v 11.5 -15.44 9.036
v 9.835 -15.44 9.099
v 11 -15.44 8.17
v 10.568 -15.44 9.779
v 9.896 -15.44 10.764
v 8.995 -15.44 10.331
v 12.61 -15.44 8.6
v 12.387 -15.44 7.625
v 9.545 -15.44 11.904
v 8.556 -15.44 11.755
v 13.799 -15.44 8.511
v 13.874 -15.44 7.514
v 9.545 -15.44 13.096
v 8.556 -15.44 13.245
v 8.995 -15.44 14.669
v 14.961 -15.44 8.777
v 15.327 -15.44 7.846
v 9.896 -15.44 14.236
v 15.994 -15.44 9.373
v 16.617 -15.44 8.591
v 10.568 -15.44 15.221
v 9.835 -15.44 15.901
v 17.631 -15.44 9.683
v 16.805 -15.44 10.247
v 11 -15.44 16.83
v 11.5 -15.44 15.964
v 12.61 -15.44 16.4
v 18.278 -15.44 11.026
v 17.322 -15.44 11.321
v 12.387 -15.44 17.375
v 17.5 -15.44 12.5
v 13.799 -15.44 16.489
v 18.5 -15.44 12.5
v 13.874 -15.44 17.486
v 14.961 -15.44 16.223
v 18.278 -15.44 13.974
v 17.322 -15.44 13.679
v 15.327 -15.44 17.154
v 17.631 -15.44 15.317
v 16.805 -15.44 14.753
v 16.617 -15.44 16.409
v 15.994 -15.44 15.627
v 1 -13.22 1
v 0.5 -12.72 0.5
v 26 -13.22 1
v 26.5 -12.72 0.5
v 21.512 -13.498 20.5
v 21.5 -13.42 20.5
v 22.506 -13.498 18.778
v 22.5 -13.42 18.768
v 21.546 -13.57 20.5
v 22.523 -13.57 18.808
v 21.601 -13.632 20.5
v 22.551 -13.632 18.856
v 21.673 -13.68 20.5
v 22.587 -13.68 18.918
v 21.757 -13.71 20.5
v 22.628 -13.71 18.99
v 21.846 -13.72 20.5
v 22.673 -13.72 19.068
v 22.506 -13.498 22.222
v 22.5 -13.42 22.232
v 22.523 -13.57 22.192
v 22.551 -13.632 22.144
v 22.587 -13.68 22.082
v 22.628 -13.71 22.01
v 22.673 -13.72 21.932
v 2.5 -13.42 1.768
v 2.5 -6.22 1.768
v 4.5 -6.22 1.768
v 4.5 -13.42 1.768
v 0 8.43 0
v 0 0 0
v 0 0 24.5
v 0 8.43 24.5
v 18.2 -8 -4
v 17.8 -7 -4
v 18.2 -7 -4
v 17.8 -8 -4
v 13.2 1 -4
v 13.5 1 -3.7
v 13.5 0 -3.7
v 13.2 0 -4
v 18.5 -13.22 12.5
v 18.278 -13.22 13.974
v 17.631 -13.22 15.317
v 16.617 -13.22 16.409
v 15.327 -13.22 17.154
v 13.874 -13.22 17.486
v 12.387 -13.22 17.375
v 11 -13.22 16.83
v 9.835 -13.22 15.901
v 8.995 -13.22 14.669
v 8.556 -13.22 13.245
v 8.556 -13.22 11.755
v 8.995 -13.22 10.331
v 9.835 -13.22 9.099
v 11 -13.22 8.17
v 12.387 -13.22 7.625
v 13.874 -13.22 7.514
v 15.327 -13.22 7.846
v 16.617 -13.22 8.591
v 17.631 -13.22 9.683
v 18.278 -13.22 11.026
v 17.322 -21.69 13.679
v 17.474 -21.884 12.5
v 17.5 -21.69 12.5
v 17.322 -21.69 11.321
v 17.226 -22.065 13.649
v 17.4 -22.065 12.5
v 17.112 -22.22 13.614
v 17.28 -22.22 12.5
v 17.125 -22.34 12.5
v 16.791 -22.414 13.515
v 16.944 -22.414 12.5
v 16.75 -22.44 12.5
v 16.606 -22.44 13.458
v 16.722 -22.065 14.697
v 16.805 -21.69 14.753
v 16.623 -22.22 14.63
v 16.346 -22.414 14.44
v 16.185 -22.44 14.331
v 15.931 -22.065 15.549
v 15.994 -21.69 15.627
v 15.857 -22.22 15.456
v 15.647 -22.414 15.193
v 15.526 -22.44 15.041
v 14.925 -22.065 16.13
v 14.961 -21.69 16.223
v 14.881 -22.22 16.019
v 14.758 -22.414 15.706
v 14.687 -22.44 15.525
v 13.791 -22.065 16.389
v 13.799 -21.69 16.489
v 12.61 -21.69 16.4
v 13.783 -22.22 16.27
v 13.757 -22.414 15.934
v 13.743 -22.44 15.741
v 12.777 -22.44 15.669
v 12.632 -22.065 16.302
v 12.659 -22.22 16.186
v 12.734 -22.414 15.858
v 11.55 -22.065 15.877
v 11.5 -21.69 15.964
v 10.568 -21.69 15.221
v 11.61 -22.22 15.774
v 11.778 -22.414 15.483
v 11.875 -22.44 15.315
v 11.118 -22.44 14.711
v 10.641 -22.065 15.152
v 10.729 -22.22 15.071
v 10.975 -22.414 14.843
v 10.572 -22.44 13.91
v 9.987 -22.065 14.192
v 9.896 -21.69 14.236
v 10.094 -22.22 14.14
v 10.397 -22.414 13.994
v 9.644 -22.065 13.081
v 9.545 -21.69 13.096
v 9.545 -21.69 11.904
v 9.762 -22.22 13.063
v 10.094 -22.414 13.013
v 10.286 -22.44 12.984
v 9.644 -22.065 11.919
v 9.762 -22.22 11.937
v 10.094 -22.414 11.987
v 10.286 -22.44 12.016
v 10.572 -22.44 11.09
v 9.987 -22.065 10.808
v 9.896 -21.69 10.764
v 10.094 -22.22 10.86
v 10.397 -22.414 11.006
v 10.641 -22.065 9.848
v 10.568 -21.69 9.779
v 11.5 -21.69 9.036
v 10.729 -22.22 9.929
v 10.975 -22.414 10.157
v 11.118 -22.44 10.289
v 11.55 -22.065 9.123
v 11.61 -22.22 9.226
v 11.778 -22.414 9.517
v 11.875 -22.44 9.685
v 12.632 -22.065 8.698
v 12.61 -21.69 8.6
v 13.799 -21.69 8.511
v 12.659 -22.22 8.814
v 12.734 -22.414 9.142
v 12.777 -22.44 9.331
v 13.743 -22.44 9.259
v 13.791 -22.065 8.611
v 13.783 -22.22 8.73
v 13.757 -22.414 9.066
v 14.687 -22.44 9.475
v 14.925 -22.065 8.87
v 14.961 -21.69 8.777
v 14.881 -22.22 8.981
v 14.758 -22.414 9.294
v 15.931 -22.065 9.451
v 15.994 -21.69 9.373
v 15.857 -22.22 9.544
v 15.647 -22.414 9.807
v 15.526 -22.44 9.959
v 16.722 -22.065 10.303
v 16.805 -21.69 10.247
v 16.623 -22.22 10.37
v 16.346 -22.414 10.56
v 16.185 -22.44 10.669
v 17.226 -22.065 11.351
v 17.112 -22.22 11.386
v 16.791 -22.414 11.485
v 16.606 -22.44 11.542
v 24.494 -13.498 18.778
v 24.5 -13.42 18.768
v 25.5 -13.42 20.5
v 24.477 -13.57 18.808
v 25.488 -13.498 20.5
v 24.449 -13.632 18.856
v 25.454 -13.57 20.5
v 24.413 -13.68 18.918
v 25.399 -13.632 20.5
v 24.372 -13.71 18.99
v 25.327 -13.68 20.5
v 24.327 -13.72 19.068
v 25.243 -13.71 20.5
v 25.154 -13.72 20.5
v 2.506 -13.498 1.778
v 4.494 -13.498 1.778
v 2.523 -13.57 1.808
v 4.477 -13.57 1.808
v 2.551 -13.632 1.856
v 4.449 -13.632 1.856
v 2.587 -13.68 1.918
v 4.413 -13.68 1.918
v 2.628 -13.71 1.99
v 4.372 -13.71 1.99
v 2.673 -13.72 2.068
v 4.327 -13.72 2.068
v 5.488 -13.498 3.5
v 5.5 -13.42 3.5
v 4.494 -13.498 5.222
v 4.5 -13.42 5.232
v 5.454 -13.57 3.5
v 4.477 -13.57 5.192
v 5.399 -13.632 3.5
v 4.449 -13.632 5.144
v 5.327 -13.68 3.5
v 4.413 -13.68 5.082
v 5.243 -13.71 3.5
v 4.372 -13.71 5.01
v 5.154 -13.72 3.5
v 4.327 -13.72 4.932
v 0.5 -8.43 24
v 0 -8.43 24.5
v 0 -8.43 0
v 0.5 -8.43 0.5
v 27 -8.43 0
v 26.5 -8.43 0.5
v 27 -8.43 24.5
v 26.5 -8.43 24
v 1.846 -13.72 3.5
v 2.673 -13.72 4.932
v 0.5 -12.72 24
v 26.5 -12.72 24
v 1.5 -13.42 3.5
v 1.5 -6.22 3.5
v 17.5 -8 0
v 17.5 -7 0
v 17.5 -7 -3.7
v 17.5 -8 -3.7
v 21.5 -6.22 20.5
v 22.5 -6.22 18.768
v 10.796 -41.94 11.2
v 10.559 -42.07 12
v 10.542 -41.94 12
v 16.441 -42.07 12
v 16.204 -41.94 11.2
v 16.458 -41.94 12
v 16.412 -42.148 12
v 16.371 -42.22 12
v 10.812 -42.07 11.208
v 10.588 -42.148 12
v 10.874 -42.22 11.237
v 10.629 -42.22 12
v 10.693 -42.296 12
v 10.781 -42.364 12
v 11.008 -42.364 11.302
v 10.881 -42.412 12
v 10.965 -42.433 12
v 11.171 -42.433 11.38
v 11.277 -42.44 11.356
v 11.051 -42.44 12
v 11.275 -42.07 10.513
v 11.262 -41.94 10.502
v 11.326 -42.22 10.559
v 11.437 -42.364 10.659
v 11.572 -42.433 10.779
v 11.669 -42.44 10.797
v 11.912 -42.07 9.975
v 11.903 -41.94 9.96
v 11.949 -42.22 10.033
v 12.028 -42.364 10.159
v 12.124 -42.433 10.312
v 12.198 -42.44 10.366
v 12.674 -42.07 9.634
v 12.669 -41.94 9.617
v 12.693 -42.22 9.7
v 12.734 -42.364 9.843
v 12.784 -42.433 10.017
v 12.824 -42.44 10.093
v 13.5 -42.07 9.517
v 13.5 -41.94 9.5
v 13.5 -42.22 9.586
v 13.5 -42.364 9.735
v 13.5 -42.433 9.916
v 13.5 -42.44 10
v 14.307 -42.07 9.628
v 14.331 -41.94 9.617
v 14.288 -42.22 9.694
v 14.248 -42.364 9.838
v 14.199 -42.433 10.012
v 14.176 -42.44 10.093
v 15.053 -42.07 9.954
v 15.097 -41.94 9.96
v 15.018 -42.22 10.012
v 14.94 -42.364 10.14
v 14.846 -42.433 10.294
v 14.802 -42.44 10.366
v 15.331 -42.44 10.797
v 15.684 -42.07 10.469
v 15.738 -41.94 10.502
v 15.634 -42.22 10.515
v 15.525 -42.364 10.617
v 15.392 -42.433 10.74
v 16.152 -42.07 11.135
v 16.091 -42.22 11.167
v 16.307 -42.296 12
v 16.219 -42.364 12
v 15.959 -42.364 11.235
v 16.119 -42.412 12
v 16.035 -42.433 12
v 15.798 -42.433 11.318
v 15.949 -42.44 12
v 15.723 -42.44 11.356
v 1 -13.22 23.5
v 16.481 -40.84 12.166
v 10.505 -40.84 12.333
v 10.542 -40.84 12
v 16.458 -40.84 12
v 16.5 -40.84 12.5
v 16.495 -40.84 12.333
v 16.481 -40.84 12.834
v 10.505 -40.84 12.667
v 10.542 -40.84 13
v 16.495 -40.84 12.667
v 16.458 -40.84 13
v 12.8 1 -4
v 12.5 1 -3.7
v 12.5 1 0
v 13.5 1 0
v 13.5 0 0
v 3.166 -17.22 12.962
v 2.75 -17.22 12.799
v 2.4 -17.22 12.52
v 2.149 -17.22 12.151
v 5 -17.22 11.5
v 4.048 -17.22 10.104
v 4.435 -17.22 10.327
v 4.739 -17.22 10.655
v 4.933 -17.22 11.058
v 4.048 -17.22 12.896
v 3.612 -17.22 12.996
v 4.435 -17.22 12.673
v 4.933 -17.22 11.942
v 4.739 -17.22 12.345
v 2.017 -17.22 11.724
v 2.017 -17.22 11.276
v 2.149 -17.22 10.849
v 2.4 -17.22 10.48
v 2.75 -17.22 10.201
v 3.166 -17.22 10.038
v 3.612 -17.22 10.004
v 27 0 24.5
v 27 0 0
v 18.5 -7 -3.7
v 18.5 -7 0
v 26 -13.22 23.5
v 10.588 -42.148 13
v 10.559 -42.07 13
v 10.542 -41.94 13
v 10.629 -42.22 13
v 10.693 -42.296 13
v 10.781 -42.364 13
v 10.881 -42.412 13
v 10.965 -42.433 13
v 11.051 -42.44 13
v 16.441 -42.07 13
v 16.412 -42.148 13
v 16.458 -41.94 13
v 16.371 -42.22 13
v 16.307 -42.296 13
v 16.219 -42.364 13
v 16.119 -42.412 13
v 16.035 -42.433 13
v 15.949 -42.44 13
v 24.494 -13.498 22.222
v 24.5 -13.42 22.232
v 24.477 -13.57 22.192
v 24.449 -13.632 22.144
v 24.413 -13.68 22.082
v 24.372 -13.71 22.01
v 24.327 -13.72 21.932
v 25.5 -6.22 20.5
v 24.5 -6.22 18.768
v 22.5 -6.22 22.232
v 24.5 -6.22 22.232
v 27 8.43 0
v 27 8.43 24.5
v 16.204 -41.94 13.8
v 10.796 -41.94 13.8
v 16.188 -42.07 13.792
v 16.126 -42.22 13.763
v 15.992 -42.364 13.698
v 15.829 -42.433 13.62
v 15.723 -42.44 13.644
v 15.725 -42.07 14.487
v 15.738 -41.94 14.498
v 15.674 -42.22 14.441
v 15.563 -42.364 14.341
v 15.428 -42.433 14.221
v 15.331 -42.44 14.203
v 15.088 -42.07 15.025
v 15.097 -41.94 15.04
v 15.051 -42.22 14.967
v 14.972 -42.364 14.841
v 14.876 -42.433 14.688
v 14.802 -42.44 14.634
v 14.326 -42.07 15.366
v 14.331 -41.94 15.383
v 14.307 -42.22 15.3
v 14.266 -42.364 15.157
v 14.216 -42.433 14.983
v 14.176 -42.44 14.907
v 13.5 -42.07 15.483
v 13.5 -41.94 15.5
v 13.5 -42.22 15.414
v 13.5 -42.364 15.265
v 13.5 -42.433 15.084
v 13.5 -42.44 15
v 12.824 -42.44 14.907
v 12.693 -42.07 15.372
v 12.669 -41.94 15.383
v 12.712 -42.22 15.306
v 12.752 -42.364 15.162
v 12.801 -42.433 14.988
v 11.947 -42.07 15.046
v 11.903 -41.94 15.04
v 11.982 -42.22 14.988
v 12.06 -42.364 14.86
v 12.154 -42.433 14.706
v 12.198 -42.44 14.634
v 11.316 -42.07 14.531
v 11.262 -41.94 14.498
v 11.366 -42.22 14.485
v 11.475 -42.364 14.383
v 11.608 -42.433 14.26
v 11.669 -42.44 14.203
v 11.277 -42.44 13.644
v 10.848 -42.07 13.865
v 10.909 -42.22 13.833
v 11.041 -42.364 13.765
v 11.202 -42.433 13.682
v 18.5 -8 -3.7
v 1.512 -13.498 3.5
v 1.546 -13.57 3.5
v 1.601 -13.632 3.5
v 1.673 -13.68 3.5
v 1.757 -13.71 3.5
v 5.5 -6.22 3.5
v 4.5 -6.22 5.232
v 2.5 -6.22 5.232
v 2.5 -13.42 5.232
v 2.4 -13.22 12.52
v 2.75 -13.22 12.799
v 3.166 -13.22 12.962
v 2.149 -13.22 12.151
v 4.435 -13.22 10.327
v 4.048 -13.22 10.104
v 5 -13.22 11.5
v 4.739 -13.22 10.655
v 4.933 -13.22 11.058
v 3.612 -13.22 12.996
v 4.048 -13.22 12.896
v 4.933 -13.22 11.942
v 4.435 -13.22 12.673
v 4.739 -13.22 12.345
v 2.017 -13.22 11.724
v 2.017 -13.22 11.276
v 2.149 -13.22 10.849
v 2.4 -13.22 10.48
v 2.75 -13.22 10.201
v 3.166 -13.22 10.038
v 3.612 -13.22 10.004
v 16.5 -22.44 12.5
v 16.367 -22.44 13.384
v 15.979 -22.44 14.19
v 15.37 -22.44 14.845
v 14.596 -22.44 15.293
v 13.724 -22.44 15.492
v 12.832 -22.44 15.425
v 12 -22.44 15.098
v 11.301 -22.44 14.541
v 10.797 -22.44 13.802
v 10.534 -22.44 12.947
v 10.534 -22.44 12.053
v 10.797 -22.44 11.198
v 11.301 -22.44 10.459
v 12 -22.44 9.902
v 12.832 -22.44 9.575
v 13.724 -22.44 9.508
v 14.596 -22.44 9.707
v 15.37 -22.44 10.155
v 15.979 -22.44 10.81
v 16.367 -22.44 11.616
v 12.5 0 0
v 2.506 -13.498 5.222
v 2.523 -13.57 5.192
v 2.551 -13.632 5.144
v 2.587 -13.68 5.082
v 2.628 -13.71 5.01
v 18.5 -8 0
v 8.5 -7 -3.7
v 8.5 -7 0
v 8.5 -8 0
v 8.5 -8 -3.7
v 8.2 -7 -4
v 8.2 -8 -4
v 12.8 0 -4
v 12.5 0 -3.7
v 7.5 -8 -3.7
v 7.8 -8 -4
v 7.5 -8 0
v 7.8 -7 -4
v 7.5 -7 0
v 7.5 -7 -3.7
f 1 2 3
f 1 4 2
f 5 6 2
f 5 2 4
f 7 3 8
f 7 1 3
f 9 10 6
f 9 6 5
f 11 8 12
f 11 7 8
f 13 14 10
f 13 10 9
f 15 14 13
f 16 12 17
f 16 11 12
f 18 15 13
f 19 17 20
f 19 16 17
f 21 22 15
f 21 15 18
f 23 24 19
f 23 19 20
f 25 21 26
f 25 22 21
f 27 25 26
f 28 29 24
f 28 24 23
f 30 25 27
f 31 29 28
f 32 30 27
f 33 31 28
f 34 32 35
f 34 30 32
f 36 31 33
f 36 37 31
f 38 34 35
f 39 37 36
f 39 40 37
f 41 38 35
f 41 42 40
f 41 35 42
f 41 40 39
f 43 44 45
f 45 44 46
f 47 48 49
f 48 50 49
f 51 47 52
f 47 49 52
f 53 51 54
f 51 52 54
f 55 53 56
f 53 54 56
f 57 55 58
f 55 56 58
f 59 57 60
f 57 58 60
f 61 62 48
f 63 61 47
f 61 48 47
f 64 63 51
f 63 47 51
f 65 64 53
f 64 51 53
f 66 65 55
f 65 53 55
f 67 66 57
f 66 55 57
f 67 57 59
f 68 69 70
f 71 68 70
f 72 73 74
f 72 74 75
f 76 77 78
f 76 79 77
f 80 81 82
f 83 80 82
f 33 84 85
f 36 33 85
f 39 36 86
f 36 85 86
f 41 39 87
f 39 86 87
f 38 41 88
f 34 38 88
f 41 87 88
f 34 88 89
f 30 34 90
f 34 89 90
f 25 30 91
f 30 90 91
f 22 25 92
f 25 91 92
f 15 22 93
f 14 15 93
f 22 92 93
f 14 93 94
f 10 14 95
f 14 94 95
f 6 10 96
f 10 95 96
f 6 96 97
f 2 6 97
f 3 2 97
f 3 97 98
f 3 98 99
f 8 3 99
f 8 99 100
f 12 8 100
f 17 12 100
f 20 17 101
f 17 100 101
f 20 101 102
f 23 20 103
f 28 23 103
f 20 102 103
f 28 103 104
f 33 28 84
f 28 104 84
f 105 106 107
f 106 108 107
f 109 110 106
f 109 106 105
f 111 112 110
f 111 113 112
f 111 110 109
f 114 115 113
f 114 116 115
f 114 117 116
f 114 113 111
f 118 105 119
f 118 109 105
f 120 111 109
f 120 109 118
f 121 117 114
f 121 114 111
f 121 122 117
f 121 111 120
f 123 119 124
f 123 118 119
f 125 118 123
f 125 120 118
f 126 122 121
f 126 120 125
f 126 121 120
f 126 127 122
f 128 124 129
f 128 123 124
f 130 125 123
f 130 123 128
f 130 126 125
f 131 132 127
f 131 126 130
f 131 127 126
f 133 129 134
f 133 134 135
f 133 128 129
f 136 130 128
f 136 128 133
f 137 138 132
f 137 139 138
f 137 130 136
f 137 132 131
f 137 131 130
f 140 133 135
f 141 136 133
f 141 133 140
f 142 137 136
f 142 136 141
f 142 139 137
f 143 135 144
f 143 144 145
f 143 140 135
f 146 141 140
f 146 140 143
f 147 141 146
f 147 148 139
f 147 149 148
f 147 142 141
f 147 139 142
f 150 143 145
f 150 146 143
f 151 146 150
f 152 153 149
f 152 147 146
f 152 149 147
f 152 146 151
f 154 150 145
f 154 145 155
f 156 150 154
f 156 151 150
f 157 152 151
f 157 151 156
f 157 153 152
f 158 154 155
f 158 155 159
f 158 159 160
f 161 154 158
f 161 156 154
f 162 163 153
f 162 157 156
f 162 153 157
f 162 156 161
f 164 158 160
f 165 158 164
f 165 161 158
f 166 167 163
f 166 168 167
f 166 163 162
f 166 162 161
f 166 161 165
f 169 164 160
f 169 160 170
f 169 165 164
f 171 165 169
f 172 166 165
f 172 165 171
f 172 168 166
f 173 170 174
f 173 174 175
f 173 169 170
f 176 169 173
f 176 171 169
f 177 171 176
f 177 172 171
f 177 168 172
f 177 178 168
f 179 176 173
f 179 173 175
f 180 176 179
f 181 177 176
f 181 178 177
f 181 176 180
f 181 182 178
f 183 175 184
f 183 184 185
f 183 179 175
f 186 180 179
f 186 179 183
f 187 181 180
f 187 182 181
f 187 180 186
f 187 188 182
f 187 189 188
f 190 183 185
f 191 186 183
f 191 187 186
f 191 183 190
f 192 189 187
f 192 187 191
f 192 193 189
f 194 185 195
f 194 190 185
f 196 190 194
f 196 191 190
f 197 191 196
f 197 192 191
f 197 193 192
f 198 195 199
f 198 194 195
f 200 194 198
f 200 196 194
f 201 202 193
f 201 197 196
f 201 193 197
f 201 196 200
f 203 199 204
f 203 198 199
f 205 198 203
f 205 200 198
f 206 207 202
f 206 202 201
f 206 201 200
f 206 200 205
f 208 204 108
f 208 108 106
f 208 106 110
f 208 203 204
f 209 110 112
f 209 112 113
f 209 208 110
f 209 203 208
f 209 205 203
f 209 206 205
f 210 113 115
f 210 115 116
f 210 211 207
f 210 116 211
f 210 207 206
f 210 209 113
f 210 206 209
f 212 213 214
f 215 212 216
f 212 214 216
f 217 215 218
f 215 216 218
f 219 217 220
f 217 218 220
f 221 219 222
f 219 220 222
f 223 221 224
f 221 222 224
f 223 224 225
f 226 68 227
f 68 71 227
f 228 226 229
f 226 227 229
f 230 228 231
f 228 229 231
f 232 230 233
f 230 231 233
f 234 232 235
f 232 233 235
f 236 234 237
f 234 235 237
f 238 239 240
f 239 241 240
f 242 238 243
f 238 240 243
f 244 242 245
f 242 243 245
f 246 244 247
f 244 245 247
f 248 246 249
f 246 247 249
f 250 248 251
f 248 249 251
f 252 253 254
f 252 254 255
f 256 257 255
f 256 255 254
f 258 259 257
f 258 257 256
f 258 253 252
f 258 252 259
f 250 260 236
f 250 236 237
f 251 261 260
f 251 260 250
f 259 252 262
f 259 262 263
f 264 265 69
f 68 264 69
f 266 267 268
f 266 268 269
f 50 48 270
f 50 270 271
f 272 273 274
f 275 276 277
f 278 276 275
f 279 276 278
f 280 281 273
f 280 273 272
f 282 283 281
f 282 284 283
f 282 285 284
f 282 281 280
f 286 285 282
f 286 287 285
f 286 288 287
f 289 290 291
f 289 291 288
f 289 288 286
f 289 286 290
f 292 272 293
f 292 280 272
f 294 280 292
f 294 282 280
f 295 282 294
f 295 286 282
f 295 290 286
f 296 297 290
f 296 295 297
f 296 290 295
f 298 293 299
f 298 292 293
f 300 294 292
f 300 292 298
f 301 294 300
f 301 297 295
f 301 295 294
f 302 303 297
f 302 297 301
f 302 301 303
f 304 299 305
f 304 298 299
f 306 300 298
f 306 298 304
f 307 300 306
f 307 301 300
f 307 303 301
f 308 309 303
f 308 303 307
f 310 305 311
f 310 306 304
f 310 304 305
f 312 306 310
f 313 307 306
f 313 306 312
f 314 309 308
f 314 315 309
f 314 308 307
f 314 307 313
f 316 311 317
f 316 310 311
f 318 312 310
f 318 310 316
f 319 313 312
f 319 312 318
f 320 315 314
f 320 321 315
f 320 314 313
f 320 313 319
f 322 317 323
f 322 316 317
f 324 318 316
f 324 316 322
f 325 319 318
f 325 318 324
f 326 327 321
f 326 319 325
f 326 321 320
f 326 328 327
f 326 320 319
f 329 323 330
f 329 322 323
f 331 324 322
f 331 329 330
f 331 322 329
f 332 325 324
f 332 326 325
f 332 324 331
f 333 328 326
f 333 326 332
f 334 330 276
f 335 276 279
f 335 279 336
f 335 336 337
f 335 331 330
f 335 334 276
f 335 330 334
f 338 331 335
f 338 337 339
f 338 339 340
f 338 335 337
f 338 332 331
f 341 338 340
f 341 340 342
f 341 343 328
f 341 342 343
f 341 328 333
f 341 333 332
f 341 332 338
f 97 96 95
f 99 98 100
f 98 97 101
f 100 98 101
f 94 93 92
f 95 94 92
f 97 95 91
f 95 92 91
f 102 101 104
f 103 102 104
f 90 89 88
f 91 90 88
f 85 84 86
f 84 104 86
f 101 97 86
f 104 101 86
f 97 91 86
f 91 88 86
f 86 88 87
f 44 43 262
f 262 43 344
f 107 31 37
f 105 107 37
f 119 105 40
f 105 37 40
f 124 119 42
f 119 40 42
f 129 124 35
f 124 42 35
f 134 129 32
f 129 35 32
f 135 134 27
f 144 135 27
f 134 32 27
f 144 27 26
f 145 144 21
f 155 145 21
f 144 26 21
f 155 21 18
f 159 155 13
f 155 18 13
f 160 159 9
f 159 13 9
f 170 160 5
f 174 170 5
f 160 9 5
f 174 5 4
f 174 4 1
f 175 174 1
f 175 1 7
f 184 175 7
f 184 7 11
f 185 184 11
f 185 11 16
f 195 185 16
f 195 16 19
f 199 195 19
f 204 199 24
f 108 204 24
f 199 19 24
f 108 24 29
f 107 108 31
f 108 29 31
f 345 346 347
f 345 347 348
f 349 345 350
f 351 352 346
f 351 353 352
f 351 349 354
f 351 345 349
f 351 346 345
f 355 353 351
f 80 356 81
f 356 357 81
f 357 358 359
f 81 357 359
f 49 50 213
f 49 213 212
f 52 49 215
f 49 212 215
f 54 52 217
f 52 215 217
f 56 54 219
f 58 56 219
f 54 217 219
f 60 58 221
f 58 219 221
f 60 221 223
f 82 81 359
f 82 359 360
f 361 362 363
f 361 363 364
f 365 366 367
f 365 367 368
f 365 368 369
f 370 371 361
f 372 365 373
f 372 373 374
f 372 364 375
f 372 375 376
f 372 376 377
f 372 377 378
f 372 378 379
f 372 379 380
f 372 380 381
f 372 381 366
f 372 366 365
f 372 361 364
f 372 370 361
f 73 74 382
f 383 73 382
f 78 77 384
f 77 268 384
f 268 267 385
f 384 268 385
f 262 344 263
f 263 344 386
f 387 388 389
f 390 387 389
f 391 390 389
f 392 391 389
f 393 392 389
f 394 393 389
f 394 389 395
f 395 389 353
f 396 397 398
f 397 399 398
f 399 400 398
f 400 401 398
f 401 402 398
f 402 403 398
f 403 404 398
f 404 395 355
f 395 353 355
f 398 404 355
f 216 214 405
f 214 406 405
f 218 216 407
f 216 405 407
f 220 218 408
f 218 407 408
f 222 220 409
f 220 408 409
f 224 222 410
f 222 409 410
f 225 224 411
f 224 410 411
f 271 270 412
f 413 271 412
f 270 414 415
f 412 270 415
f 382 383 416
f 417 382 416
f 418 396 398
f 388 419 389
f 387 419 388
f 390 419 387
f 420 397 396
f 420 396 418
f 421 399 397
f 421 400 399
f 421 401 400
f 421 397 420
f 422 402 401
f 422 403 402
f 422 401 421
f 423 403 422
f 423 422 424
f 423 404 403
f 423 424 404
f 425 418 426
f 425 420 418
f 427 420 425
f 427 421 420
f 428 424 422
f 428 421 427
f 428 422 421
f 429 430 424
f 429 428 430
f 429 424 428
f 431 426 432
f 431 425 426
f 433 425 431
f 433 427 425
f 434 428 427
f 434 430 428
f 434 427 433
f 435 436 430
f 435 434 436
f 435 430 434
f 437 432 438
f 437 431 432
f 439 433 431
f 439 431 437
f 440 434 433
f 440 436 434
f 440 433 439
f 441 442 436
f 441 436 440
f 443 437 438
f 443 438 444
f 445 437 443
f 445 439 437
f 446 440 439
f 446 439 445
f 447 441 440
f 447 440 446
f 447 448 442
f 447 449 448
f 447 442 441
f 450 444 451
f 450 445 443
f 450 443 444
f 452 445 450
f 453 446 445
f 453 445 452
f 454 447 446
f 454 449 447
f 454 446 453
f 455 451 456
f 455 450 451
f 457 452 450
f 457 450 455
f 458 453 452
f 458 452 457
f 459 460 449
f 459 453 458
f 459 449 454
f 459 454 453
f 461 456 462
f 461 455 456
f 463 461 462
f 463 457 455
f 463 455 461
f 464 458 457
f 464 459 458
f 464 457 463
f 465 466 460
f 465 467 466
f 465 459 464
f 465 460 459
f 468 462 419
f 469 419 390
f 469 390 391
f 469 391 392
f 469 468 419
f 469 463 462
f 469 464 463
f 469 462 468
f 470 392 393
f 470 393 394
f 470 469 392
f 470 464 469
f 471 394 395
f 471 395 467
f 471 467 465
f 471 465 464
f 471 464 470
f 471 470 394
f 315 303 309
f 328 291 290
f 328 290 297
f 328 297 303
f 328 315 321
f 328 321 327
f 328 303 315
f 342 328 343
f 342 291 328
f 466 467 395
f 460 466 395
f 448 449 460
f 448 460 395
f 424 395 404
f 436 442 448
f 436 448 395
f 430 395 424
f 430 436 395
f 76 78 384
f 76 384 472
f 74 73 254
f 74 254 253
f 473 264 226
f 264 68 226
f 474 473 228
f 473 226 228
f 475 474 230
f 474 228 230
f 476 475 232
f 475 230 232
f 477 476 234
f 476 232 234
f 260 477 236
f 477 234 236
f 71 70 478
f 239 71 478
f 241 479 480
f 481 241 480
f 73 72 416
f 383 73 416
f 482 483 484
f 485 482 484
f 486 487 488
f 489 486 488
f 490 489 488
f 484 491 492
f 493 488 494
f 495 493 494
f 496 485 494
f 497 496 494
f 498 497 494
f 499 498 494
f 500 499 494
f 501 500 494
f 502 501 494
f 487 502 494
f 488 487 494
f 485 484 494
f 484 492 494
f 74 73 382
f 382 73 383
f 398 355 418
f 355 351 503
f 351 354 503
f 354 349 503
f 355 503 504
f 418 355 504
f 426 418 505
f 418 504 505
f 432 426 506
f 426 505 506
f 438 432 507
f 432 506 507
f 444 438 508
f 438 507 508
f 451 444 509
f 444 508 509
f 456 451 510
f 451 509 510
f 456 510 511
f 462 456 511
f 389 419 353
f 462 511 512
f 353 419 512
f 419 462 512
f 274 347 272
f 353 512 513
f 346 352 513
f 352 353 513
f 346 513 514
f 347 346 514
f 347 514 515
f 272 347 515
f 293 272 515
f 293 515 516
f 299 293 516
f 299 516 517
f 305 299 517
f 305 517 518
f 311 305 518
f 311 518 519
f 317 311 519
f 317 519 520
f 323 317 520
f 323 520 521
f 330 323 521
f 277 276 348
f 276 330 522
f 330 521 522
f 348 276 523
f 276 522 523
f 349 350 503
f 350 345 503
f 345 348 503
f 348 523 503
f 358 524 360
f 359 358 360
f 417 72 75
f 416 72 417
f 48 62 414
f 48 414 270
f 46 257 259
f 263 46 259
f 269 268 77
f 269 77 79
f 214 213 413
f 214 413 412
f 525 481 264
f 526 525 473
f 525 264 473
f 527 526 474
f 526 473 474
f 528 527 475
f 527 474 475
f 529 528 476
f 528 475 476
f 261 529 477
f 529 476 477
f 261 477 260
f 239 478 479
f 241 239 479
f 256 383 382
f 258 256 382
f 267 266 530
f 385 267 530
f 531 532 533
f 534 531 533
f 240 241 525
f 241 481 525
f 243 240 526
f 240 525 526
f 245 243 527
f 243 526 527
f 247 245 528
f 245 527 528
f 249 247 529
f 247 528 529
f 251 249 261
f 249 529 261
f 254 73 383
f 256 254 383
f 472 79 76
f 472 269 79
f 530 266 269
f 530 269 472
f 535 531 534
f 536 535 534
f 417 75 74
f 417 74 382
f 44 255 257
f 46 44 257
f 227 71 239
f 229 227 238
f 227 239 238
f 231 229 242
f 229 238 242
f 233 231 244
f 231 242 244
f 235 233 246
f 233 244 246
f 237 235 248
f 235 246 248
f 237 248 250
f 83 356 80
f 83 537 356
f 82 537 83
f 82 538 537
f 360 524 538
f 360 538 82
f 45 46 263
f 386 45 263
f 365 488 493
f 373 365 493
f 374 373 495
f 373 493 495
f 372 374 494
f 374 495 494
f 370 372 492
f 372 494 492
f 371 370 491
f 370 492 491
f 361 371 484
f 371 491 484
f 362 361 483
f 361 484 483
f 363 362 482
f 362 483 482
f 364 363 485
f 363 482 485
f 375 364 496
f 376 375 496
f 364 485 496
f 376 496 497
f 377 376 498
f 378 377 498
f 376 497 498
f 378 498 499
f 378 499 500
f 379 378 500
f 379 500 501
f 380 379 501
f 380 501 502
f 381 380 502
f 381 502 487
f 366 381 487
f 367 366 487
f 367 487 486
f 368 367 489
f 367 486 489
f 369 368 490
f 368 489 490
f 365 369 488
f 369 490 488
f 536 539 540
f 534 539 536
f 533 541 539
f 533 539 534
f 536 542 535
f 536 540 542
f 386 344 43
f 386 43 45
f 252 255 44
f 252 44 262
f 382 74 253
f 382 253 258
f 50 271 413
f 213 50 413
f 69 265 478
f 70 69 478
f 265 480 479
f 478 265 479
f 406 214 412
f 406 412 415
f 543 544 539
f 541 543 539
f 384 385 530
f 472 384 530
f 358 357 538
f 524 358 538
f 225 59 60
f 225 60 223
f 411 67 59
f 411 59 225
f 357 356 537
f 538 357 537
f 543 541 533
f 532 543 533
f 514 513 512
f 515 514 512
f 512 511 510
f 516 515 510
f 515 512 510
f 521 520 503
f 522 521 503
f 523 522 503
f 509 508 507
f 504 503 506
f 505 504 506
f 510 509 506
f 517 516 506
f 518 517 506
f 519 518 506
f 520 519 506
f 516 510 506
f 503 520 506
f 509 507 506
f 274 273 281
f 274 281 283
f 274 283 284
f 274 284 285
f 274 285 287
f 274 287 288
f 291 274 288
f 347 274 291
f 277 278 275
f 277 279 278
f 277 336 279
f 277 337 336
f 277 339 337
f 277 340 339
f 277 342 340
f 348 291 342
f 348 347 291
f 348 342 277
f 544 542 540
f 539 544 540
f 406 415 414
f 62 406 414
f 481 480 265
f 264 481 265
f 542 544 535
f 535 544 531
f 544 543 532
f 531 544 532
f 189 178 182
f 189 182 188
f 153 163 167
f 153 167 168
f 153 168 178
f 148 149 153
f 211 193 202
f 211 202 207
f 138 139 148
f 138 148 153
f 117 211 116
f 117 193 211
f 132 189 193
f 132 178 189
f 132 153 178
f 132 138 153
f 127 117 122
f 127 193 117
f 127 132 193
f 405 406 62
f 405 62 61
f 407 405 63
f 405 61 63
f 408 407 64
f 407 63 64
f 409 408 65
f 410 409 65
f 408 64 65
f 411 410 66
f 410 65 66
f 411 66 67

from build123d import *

# Parameters (mm, degrees)
BOX_W             = 27
BOX_H             = 8.43
BOX_DEPTH         = 24.5
BOX001_W          = 27
BOX001_H          = 24.5
BOX001_DEPTH      = 8.43
BOX002_W          = 26
BOX002_H          = 23.5
BOX002_DEPTH      = 6.22
CHAMFER_SIZE      = 0.5
CYLINDER_R        = 5
CYLINDER_DEPTH    = 2.22
CYLINDER001_R     = 4
CYLINDER001_DEPTH = 7
FILLET_R          = 0.75
CYLINDER002_R     = 3
CYLINDER002_DEPTH = 20
FILLET001_R       = 0.5
BOX003_W          = 7
BOX003_H          = 1
BOX003_DEPTH      = 1.6
CYLINDER003_R     = 1.5
CYLINDER003_DEPTH = 4
BOX004_W          = 1
BOX004_H          = 1
BOX004_DEPTH      = 4
CHAMFER005_SIZE   = 0.3
CHAMFER006_SIZE   = 0.3
BOX005_W          = 1
BOX005_H          = 1
BOX005_DEPTH      = 4
CHAMFER003_SIZE   = 0.3
CHAMFER004_SIZE   = 0.3
BOX006_W          = 1
BOX006_H          = 1
BOX006_DEPTH      = 4
CHAMFER001_SIZE   = 0.3
CHAMFER002_SIZE   = 0.3
PRISM_DEPTH       = 7.5
FILLET002_R       = 0.3
PRISM001_DEPTH    = 7.5
FILLET003_R       = 0.3


with BuildPart() as body:
    # Box → Box (join)
    with BuildSketch(Plane.XY):
        with Locations((13.5, 4.215)):
            Rectangle(BOX_W, BOX_H)
    extrude(amount=BOX_DEPTH)


with BuildPart() as body001:
    # Box001 → Box001 (join)
    with BuildSketch(Plane.XZ):
        with Locations((13.5, 12.25)):
            Rectangle(BOX001_W, BOX001_H)
    extrude(amount=BOX001_DEPTH)

    # Box002 → Box002 (join)
    with BuildSketch(Plane(origin=(0.5, -7, 0.5), x_dir=(1, 0, 0), z_dir=(0, -1, 0))):
        with Locations((13, 11.75)):
            Rectangle(BOX002_W, BOX002_H)
    extrude(amount=BOX002_DEPTH)

    # Chamfer
    chamfer_edges = [body001.edges().sort_by_distance(p)[0] for p in [
        (13.5, -13.22, 24),
        (26.5, -13.22, 12.25),
        (13.5, -13.22, 0.5),
        (0.5, -13.22, 12.25),
    ]]
    chamfer(chamfer_edges, length=CHAMFER_SIZE)


with BuildPart() as body002:
    # Cylinder → Cylinder (join)
    with BuildSketch(Plane(origin=(13.5, -13.22, 12.5), x_dir=(1, 0, 0), z_dir=(0, -1, 0))):
        Circle(CYLINDER_R)
    extrude(amount=CYLINDER_DEPTH)

    # Cylinder001 → Cylinder001 (join)
    with BuildSketch(Plane(origin=(13.5, -15.44, 12.5), x_dir=(1, 0, 0), z_dir=(0, -1, 0))):
        Circle(CYLINDER001_R)
    extrude(amount=CYLINDER001_DEPTH)

    # Fillet
    fillet_edges = [body002.edges().sort_by_distance(p)[0] for p in [
        (9.5, -22.44, 12.5),
    ]]
    fillet(fillet_edges, radius=FILLET_R)


with BuildPart() as body003:
    # Cylinder002 → Cylinder002 (join)
    with BuildSketch(Plane(origin=(13.5, -22.44, 12.5), x_dir=(1, 0, 0), z_dir=(0, -1, 0))):
        Circle(CYLINDER002_R)
    extrude(amount=CYLINDER002_DEPTH)

    # Fillet001
    fillet001_edges = [body003.edges().sort_by_distance(p)[0] for p in [
        (10.5, -42.44, 12.5),
    ]]
    fillet(fillet001_edges, radius=FILLET001_R)

    # Box003 → Box003 (cut)
    with BuildSketch(Plane(origin=(9.9, -40.84, 12), x_dir=(1, 0, 0), z_dir=(0, -1, 0))):
        with Locations((3.5, 0.5)):
            Rectangle(BOX003_W, BOX003_H)
    extrude(amount=BOX003_DEPTH, mode=Mode.SUBTRACT)

    # Cylinder003 → Cylinder003 (join)
    with BuildSketch(Plane(origin=(3.5, -13.22, 11.5), x_dir=(1, 0, 0), z_dir=(0, -1, 0))):
        Circle(CYLINDER003_R)
    extrude(amount=CYLINDER003_DEPTH)


with BuildPart() as body004:
    # Box004 → Box004 (join)
    with BuildSketch(Plane(origin=(7.5, -7, 0), x_dir=(1, 0, 0), z_dir=(0, 0, -1))):
        with Locations((0.5, 0.5)):
            Rectangle(BOX004_W, BOX004_H)
    extrude(amount=BOX004_DEPTH)

    # Chamfer005
    chamfer005_edges = [body004.edges().sort_by_distance(p)[0] for p in [
        (7.5, -7.5, -4),
    ]]
    chamfer(chamfer005_edges, length=CHAMFER005_SIZE)

    # Chamfer006
    chamfer006_edges = [body004.edges().sort_by_distance(p)[0] for p in [
        (8.5, -7.5, -4),
    ]]
    chamfer(chamfer006_edges, length=CHAMFER006_SIZE)


with BuildPart() as body005:
    # Box005 → Box005 (join)
    with BuildSketch(Plane(origin=(12.5, 1, 0), x_dir=(1, 0, 0), z_dir=(0, 0, -1))):
        with Locations((0.5, 0.5)):
            Rectangle(BOX005_W, BOX005_H)
    extrude(amount=BOX005_DEPTH)

    # Chamfer003
    chamfer003_edges = [body005.edges().sort_by_distance(p)[0] for p in [
        (12.5, 0.5, -4),
    ]]
    chamfer(chamfer003_edges, length=CHAMFER003_SIZE)

    # Chamfer004
    chamfer004_edges = [body005.edges().sort_by_distance(p)[0] for p in [
        (13.5, 0.5, -4),
    ]]
    chamfer(chamfer004_edges, length=CHAMFER004_SIZE)


with BuildPart() as body006:
    # Box006 → Box006 (join)
    with BuildSketch(Plane(origin=(17.5, -7, 0), x_dir=(1, 0, 0), z_dir=(0, 0, -1))):
        with Locations((0.5, 0.5)):
            Rectangle(BOX006_W, BOX006_H)
    extrude(amount=BOX006_DEPTH)

    # Chamfer001
    chamfer001_edges = [body006.edges().sort_by_distance(p)[0] for p in [
        (18.5, -7.5, -4),
    ]]
    chamfer(chamfer001_edges, length=CHAMFER001_SIZE)

    # Chamfer002
    chamfer002_edges = [body006.edges().sort_by_distance(p)[0] for p in [
        (17.5, -7.5, -4),
    ]]
    chamfer(chamfer002_edges, length=CHAMFER002_SIZE)


with BuildPart() as body007:
    # Prism → Prism (join)
    with BuildSketch(Plane(origin=(23.5, -6.22, 20.5), x_dir=(1, 0, 0), z_dir=(0, -1, 0))):
        Polygon((2, 0), (1, 1.732051), (-1, 1.732051), (-2, 0), (-1, -1.732051), (1, -1.732051), align=None)
    extrude(amount=PRISM_DEPTH)

    # Fillet002
    fillet002_edges = [body007.edges().sort_by_distance(p)[0] for p in [
        (22, -13.72, 21.366025),
        (23.5, -13.72, 22.232051),
        (25, -13.72, 21.366025),
        (25, -13.72, 19.633975),
        (23.5, -13.72, 18.767949),
        (22, -13.72, 19.633975),
    ]]
    fillet(fillet002_edges, radius=FILLET002_R)


with BuildPart() as body008:
    # Prism001 → Prism001 (join)
    with BuildSketch(Plane(origin=(3.5, -6.22, 3.5), x_dir=(1, 0, 0), z_dir=(0, -1, 0))):
        Polygon((2, 0), (1, 1.732051), (-1, 1.732051), (-2, 0), (-1, -1.732051), (1, -1.732051), align=None)
    extrude(amount=PRISM001_DEPTH)

    # Fillet003
    fillet003_edges = [body008.edges().sort_by_distance(p)[0] for p in [
        (5, -13.72, 4.366025),
        (3.5, -13.72, 5.232051),
        (2, -13.72, 4.366025),
        (2, -13.72, 2.633975),
        (3.5, -13.72, 1.767949),
        (5, -13.72, 2.633975),
    ]]
    fillet(fillet003_edges, radius=FILLET003_R)


solid = Compound([body.part, body001.part, body002.part, body003.part, body004.part, body005.part, body006.part, body007.part, body008.part])
